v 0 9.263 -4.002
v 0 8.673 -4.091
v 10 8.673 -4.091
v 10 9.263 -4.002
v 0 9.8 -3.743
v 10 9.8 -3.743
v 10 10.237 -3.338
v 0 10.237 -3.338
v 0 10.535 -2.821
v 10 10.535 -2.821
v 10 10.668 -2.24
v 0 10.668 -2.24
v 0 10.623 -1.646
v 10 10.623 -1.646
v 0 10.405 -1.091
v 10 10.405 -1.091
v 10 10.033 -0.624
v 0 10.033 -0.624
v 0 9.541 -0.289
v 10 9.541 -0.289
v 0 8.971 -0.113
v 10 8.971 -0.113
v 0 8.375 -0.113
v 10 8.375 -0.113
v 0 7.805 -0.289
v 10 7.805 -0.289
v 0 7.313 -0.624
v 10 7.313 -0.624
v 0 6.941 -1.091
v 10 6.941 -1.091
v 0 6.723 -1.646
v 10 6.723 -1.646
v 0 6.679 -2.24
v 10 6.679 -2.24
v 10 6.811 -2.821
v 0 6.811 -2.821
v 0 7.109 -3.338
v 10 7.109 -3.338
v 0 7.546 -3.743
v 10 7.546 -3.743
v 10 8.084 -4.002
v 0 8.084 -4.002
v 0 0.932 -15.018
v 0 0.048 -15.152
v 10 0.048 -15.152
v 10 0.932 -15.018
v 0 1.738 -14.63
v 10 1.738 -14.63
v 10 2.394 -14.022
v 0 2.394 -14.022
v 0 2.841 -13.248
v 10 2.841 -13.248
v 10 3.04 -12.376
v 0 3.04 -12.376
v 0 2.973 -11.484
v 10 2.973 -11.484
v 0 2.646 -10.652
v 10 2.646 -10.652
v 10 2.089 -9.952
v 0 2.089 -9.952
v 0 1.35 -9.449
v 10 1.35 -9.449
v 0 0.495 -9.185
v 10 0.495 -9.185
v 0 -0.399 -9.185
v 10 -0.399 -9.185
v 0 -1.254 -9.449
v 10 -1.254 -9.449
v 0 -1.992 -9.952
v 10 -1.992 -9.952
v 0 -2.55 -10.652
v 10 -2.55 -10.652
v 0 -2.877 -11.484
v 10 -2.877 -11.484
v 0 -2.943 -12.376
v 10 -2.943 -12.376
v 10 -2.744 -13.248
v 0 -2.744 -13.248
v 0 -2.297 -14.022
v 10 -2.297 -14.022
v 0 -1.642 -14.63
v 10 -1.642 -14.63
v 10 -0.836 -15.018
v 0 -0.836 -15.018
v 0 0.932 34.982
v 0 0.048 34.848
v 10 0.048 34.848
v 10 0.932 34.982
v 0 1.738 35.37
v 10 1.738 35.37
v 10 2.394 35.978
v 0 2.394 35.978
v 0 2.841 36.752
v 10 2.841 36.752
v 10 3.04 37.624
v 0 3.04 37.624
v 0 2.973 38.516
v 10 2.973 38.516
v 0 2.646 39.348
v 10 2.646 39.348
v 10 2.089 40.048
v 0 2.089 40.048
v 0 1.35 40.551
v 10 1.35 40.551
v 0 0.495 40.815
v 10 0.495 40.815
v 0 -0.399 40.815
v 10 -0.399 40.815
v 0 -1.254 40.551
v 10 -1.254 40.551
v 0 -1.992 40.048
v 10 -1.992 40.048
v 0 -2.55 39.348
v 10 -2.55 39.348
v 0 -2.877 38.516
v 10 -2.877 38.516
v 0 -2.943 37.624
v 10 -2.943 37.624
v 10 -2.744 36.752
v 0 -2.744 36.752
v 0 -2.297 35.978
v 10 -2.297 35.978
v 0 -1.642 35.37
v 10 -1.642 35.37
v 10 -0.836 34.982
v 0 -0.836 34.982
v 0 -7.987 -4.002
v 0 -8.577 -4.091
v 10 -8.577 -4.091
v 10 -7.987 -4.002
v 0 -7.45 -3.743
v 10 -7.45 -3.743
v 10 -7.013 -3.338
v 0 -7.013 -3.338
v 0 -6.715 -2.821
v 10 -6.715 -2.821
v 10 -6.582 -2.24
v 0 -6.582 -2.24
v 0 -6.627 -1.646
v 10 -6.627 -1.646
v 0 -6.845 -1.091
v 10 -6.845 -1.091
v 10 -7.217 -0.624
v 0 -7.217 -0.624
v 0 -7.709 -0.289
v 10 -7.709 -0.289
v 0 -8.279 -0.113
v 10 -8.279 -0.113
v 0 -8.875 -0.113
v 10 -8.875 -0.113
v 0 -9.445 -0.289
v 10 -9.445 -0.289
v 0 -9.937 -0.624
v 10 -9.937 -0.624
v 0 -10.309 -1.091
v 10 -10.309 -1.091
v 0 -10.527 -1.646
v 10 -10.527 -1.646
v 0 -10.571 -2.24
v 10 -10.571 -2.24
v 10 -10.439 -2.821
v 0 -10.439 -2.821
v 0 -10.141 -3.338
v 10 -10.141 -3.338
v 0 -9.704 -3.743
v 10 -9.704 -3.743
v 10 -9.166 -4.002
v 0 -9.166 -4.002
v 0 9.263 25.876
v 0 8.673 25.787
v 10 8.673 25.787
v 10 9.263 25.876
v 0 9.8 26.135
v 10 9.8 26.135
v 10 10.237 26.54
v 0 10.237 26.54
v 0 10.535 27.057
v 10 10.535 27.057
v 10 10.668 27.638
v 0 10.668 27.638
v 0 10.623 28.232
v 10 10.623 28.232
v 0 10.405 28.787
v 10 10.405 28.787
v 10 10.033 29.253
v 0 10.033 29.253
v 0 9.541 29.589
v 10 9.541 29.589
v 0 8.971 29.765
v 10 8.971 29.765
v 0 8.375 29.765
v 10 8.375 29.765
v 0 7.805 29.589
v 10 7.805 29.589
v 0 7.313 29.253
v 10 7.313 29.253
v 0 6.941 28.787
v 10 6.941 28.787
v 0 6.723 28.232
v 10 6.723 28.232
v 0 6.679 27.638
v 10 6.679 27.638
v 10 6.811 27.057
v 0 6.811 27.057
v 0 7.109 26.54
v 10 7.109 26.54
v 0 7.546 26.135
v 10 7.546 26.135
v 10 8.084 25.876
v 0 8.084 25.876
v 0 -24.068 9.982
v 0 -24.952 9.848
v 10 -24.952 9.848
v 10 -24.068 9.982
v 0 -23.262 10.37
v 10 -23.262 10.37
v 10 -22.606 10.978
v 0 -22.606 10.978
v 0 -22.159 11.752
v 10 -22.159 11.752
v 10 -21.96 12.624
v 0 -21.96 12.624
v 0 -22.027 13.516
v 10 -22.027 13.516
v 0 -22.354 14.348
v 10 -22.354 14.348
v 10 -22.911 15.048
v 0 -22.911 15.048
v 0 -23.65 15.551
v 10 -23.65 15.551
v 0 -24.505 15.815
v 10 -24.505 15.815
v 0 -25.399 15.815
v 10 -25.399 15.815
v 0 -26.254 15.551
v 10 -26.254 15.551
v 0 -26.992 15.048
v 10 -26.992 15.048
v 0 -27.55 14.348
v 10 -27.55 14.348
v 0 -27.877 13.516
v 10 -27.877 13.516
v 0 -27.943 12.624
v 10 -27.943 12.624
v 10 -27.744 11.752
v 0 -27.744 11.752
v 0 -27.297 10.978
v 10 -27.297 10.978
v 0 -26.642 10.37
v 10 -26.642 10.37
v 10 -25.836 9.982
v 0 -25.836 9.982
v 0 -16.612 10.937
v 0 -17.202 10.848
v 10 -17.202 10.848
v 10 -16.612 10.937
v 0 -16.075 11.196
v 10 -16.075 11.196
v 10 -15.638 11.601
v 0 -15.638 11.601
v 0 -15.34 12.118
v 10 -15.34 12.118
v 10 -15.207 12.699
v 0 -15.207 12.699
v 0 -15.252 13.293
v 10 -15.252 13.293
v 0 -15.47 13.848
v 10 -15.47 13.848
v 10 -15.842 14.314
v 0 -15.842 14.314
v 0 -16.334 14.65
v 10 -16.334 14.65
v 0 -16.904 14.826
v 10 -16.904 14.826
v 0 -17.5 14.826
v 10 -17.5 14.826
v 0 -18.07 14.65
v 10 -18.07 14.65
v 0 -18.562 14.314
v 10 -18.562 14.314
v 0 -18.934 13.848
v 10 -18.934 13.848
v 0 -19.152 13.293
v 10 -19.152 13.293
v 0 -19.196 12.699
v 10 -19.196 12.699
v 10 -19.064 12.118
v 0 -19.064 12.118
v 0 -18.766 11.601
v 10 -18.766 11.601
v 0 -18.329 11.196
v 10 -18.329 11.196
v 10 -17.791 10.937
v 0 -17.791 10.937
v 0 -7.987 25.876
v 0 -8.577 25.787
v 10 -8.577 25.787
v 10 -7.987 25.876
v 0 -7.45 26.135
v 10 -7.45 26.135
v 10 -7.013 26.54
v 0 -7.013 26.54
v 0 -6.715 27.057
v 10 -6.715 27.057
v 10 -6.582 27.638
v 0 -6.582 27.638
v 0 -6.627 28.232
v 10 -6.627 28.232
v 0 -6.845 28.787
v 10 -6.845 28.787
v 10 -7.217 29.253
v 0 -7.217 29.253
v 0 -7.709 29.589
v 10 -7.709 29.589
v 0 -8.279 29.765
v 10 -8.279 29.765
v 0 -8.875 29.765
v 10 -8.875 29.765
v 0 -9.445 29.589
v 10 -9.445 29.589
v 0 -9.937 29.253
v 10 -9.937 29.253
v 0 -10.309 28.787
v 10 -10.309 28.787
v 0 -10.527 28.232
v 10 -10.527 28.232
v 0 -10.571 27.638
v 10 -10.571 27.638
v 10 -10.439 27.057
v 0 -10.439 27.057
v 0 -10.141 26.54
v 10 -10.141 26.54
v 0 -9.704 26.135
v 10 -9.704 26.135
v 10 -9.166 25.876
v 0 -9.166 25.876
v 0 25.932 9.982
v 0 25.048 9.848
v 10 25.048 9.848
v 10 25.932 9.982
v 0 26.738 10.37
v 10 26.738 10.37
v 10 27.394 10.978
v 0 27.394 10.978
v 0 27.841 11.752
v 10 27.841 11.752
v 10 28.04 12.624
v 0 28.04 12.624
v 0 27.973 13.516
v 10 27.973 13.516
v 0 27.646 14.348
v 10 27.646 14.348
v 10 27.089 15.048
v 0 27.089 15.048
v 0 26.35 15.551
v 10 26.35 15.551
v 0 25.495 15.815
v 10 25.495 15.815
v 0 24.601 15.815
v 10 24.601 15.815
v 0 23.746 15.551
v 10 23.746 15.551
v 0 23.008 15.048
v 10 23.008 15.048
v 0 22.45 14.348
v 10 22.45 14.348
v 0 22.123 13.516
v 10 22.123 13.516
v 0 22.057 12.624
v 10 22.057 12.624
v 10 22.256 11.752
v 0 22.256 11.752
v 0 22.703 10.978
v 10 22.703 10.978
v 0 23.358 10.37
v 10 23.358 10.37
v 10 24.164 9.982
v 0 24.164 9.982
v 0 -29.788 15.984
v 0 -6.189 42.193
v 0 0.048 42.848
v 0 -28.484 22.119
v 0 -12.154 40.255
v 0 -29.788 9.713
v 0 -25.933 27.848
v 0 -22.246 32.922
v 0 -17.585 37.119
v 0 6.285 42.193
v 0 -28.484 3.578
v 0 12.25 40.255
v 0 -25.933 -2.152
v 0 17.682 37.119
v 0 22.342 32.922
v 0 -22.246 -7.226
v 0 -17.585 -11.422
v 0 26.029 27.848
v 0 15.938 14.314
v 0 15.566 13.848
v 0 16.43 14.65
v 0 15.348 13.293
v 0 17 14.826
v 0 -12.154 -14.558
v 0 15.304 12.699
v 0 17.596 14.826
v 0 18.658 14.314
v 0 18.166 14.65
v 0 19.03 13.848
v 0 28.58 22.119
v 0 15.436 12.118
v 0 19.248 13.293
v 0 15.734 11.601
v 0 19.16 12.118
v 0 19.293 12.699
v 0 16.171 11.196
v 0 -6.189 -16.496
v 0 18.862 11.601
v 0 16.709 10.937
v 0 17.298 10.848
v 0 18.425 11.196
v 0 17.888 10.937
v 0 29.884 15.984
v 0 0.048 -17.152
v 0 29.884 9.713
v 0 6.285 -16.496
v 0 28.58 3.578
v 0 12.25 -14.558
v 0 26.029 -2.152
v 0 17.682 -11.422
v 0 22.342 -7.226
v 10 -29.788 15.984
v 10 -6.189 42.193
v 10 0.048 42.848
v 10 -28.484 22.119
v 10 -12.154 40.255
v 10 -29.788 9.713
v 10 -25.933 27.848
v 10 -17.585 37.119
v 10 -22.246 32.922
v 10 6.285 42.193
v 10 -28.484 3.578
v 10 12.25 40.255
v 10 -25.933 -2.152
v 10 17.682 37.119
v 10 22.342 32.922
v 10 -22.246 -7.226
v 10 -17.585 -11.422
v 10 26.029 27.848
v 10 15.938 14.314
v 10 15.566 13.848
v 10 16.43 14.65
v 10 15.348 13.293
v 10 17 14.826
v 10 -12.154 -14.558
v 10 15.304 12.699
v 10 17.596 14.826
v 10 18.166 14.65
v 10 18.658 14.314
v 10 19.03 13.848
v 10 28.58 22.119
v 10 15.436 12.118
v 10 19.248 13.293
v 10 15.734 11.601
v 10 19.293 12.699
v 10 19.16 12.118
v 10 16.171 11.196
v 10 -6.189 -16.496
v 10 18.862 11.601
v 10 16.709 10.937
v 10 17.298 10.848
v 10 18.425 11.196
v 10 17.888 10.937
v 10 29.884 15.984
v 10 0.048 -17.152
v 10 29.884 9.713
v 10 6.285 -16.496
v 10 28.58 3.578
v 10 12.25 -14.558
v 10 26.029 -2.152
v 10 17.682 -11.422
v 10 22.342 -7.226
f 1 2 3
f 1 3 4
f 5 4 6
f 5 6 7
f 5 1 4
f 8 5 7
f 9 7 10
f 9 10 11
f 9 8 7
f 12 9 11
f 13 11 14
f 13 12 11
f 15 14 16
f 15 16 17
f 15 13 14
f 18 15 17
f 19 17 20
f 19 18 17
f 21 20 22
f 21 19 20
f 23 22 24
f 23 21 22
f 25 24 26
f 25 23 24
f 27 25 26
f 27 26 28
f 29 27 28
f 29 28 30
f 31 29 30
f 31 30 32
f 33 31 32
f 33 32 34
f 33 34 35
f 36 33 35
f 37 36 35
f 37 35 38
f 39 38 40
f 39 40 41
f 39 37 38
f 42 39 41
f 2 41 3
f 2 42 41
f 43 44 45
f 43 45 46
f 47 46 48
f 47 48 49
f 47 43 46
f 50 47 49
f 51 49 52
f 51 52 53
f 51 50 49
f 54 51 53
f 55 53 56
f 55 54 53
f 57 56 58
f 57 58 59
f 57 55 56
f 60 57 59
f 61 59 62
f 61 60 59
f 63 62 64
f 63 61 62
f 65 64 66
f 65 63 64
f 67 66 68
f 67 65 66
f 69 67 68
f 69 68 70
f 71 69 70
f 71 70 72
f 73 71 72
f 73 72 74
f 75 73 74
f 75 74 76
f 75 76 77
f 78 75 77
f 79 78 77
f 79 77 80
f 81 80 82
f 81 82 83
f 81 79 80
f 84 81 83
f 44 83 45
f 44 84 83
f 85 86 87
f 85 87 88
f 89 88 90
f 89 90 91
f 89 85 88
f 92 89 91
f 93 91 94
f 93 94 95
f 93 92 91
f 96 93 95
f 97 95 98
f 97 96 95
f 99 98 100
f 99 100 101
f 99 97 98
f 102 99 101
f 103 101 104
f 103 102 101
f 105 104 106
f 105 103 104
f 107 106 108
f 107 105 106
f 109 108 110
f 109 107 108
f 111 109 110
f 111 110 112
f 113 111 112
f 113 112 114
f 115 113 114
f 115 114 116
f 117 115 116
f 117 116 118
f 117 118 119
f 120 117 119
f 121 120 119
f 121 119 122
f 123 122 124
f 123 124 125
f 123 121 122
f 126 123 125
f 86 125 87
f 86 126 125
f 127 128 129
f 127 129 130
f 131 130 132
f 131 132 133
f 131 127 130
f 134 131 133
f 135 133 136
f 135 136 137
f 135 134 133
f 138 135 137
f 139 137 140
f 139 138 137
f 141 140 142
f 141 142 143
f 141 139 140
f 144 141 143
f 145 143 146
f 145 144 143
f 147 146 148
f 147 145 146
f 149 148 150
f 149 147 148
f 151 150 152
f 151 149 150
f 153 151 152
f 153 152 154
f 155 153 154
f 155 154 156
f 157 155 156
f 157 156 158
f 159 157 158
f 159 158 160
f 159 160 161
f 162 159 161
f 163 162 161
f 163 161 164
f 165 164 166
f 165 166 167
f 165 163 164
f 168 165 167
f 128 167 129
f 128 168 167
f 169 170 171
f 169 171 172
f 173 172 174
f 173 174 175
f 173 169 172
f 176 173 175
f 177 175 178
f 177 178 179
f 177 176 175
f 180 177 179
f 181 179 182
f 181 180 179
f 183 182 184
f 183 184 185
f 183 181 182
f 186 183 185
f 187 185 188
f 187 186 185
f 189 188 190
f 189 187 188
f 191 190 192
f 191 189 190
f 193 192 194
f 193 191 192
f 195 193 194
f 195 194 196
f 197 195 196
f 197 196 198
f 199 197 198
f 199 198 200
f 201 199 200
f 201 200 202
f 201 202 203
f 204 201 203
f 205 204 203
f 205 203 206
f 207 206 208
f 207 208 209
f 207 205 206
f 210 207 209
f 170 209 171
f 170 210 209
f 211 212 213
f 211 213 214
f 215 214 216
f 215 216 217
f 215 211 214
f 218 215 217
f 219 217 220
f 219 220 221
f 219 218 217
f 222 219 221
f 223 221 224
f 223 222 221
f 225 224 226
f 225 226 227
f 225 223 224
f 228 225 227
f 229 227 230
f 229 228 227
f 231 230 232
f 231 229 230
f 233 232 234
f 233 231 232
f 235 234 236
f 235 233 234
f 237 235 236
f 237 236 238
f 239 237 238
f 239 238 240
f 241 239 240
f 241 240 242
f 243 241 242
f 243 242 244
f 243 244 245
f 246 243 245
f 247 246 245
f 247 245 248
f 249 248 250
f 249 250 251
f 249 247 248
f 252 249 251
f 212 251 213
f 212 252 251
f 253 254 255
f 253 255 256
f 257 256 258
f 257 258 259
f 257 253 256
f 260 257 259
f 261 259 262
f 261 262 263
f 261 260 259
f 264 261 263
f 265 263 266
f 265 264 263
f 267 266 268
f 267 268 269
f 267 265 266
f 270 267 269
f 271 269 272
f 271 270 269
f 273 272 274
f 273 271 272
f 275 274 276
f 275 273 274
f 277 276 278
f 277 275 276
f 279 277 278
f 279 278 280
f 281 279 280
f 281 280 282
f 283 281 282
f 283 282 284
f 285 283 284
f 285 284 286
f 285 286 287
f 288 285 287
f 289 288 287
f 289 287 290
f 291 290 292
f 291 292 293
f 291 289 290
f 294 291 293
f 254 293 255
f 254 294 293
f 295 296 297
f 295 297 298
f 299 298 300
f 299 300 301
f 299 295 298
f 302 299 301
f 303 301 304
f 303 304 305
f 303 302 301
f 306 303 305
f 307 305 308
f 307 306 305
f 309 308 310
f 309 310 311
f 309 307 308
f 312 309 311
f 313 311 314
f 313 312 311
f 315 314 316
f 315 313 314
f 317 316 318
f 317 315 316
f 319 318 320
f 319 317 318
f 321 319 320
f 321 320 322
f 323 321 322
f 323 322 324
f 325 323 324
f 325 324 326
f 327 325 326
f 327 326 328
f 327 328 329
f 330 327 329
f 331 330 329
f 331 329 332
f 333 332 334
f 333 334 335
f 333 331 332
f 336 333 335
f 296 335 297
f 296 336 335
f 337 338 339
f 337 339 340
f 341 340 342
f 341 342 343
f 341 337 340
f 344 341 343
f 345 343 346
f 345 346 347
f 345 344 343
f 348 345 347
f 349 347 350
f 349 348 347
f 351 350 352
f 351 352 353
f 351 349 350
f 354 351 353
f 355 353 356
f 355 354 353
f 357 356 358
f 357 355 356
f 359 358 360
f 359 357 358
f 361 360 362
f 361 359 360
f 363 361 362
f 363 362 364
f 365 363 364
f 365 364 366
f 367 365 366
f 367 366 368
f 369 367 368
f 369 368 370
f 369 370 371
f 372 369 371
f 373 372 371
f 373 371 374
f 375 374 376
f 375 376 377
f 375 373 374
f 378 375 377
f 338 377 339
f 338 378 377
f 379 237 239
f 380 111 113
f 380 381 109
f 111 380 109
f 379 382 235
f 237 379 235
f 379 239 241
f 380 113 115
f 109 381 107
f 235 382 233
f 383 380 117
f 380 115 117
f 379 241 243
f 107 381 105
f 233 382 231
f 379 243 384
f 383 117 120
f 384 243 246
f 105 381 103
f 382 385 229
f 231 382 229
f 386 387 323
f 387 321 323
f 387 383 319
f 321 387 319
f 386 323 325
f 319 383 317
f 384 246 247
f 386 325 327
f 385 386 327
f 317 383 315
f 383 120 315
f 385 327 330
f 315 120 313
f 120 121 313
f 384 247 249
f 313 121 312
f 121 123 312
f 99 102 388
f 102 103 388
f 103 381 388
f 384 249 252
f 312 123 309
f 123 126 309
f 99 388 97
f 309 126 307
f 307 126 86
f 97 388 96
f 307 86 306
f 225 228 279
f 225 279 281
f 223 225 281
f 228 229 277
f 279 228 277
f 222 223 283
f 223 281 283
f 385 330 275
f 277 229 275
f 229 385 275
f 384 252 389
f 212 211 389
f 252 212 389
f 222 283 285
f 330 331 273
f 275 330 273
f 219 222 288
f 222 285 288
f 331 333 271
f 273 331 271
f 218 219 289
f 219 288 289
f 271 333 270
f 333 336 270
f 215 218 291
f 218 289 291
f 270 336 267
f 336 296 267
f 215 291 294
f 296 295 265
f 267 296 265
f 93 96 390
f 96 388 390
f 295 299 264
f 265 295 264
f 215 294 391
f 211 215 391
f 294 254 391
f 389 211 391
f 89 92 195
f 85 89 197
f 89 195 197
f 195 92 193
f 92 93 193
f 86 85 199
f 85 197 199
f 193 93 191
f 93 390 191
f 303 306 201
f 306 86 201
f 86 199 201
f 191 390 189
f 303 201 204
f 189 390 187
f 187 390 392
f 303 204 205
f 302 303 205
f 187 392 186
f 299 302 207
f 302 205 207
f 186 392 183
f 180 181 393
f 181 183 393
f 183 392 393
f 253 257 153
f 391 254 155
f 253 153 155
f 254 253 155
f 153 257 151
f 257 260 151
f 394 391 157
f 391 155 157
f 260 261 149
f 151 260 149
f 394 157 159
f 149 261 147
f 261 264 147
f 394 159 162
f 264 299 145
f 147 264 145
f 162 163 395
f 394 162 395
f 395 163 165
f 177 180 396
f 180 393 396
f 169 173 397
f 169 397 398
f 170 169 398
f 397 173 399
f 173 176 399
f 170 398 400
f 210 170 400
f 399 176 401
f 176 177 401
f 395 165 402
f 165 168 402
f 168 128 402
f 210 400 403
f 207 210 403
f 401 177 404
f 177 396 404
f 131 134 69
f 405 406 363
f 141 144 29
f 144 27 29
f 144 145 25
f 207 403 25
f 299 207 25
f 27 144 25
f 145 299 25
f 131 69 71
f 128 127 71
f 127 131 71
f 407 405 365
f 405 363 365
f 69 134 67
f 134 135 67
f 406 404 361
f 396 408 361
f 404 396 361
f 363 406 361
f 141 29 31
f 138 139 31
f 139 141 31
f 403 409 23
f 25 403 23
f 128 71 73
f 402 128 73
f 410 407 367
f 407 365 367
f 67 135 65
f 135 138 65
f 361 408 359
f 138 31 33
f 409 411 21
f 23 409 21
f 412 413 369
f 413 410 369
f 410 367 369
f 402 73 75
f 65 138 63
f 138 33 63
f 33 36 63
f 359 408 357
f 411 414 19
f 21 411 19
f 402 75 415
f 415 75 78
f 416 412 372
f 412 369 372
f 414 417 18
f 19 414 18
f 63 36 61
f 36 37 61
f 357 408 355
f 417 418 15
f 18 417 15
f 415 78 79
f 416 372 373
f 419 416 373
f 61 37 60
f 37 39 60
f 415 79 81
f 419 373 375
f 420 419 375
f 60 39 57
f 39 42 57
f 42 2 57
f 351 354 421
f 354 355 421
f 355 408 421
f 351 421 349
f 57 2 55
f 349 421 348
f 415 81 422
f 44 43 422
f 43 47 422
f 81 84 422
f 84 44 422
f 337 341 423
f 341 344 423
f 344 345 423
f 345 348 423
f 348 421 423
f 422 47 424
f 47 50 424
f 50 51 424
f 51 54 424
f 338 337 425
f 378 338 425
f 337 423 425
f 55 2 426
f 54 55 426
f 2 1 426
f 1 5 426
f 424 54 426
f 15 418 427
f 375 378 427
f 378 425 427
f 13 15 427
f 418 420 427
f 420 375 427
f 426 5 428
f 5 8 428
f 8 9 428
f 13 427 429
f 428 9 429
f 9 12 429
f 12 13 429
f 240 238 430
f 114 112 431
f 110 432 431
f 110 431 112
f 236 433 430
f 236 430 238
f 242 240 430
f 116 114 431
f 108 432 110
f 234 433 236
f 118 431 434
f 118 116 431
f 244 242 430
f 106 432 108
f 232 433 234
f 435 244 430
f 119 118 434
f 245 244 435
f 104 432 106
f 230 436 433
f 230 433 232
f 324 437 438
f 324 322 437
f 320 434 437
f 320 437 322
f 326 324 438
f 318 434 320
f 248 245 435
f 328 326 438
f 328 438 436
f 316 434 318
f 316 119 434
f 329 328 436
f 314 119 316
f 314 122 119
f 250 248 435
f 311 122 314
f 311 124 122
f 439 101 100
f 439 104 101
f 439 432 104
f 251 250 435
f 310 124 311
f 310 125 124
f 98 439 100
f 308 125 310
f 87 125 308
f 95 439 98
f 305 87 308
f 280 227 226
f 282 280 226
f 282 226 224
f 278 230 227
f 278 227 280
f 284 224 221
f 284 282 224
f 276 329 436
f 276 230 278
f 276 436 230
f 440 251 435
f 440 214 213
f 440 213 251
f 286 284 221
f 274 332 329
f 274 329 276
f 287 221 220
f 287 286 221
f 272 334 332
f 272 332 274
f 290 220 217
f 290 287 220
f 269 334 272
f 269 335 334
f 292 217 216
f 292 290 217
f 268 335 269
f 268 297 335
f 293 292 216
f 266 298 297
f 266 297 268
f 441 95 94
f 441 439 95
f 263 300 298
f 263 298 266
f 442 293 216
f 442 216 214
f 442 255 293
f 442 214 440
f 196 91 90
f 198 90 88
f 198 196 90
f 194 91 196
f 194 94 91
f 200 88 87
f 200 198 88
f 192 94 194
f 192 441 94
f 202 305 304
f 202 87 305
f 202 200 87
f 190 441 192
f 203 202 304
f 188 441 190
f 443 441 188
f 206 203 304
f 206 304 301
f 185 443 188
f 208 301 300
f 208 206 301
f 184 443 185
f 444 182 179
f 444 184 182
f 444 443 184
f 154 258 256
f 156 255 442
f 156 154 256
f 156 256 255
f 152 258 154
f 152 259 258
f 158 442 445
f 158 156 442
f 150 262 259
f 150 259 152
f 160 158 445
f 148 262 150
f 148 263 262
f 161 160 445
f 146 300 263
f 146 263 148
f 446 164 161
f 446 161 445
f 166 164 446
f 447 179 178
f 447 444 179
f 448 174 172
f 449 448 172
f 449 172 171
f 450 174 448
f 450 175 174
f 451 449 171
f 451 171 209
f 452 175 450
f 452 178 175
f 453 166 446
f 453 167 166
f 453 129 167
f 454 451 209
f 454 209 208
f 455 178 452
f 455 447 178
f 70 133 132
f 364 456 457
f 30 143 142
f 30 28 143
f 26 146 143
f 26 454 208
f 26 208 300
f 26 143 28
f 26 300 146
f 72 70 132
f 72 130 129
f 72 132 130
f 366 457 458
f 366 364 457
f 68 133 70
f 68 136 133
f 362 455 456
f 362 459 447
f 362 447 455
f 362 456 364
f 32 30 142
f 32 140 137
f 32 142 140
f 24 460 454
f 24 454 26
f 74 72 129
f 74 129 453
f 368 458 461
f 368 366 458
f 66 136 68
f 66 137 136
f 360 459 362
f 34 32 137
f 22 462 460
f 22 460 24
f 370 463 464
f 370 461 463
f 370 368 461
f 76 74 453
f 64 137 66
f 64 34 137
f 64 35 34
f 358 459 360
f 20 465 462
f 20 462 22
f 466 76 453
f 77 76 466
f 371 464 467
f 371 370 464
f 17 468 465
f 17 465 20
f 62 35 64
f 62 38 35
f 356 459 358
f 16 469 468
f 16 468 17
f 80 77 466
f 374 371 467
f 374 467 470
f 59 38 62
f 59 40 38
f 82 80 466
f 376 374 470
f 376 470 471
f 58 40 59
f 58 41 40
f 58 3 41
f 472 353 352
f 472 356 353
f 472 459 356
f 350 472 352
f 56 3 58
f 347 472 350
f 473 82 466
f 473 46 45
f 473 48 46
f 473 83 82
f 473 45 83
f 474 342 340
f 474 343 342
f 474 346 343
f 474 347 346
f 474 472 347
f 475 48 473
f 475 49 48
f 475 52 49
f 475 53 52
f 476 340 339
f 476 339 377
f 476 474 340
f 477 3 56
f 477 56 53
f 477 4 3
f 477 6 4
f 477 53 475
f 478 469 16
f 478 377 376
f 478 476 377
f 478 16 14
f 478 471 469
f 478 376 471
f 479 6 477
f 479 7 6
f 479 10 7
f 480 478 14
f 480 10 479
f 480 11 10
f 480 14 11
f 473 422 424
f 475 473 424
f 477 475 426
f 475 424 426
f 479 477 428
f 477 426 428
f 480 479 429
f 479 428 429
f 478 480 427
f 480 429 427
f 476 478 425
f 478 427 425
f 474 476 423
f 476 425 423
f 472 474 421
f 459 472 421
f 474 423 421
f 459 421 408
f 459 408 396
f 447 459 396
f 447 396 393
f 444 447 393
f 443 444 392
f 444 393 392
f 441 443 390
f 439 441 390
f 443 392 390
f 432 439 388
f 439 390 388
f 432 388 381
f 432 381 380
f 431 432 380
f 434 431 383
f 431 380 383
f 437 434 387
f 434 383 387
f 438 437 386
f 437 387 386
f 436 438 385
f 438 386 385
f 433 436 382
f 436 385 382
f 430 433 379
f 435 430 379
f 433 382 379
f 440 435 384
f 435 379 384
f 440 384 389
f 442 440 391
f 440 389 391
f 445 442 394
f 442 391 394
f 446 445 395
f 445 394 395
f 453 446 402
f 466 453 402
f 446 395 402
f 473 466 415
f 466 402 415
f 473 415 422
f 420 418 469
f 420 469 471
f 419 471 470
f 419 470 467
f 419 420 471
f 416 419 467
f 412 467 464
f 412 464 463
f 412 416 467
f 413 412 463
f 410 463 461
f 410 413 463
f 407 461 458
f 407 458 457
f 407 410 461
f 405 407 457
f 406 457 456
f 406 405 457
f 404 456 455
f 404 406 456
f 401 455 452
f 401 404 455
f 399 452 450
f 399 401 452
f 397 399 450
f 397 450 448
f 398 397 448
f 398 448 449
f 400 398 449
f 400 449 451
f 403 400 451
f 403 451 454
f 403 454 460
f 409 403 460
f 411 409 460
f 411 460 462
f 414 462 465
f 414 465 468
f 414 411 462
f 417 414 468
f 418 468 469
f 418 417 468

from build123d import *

# Parameters (mm, degrees)
SKETCH_1_R      = 30
SKETCH_1_R_2    = 2
SKETCH_1_R_3    = 3
EXTRUDE_1_DEPTH = 10


with BuildPart() as part:
    # 草图1 → 凸台-拉伸1 (new body)
    with BuildSketch(Plane(origin=(0, 0, 0), x_dir=(0, 0, -1), z_dir=(1, 0, 0))):
        with Locations((-12.848392551, 0.04812132)):
            Circle(SKETCH_1_R)
        with Locations((-12.848392551, 17.29812132)):
            Circle(SKETCH_1_R_2, mode=Mode.SUBTRACT)
        with Locations((2.090545664, 8.67312132)):
            Circle(SKETCH_1_R_2, mode=Mode.SUBTRACT)
        with Locations((2.090545664, -8.57687868)):
            Circle(SKETCH_1_R_2, mode=Mode.SUBTRACT)
        with Locations((-12.848392551, -17.20187868)):
            Circle(SKETCH_1_R_2, mode=Mode.SUBTRACT)
        with Locations((-27.787330766, -8.57687868)):
            Circle(SKETCH_1_R_2, mode=Mode.SUBTRACT)
        with Locations((-27.787330766, 8.67312132)):
            Circle(SKETCH_1_R_2, mode=Mode.SUBTRACT)
        with Locations((-12.848392551, 25.04812132)):
            Circle(SKETCH_1_R_3, mode=Mode.SUBTRACT)
        with Locations((12.151607449, 0.04812132)):
            Circle(SKETCH_1_R_3, mode=Mode.SUBTRACT)
        with Locations((-12.848392551, -24.95187868)):
            Circle(SKETCH_1_R_3, mode=Mode.SUBTRACT)
        with Locations((-37.848392551, 0.04812132)):
            Circle(SKETCH_1_R_3, mode=Mode.SUBTRACT)
    extrude(amount=EXTRUDE_1_DEPTH)


solid = part.part
